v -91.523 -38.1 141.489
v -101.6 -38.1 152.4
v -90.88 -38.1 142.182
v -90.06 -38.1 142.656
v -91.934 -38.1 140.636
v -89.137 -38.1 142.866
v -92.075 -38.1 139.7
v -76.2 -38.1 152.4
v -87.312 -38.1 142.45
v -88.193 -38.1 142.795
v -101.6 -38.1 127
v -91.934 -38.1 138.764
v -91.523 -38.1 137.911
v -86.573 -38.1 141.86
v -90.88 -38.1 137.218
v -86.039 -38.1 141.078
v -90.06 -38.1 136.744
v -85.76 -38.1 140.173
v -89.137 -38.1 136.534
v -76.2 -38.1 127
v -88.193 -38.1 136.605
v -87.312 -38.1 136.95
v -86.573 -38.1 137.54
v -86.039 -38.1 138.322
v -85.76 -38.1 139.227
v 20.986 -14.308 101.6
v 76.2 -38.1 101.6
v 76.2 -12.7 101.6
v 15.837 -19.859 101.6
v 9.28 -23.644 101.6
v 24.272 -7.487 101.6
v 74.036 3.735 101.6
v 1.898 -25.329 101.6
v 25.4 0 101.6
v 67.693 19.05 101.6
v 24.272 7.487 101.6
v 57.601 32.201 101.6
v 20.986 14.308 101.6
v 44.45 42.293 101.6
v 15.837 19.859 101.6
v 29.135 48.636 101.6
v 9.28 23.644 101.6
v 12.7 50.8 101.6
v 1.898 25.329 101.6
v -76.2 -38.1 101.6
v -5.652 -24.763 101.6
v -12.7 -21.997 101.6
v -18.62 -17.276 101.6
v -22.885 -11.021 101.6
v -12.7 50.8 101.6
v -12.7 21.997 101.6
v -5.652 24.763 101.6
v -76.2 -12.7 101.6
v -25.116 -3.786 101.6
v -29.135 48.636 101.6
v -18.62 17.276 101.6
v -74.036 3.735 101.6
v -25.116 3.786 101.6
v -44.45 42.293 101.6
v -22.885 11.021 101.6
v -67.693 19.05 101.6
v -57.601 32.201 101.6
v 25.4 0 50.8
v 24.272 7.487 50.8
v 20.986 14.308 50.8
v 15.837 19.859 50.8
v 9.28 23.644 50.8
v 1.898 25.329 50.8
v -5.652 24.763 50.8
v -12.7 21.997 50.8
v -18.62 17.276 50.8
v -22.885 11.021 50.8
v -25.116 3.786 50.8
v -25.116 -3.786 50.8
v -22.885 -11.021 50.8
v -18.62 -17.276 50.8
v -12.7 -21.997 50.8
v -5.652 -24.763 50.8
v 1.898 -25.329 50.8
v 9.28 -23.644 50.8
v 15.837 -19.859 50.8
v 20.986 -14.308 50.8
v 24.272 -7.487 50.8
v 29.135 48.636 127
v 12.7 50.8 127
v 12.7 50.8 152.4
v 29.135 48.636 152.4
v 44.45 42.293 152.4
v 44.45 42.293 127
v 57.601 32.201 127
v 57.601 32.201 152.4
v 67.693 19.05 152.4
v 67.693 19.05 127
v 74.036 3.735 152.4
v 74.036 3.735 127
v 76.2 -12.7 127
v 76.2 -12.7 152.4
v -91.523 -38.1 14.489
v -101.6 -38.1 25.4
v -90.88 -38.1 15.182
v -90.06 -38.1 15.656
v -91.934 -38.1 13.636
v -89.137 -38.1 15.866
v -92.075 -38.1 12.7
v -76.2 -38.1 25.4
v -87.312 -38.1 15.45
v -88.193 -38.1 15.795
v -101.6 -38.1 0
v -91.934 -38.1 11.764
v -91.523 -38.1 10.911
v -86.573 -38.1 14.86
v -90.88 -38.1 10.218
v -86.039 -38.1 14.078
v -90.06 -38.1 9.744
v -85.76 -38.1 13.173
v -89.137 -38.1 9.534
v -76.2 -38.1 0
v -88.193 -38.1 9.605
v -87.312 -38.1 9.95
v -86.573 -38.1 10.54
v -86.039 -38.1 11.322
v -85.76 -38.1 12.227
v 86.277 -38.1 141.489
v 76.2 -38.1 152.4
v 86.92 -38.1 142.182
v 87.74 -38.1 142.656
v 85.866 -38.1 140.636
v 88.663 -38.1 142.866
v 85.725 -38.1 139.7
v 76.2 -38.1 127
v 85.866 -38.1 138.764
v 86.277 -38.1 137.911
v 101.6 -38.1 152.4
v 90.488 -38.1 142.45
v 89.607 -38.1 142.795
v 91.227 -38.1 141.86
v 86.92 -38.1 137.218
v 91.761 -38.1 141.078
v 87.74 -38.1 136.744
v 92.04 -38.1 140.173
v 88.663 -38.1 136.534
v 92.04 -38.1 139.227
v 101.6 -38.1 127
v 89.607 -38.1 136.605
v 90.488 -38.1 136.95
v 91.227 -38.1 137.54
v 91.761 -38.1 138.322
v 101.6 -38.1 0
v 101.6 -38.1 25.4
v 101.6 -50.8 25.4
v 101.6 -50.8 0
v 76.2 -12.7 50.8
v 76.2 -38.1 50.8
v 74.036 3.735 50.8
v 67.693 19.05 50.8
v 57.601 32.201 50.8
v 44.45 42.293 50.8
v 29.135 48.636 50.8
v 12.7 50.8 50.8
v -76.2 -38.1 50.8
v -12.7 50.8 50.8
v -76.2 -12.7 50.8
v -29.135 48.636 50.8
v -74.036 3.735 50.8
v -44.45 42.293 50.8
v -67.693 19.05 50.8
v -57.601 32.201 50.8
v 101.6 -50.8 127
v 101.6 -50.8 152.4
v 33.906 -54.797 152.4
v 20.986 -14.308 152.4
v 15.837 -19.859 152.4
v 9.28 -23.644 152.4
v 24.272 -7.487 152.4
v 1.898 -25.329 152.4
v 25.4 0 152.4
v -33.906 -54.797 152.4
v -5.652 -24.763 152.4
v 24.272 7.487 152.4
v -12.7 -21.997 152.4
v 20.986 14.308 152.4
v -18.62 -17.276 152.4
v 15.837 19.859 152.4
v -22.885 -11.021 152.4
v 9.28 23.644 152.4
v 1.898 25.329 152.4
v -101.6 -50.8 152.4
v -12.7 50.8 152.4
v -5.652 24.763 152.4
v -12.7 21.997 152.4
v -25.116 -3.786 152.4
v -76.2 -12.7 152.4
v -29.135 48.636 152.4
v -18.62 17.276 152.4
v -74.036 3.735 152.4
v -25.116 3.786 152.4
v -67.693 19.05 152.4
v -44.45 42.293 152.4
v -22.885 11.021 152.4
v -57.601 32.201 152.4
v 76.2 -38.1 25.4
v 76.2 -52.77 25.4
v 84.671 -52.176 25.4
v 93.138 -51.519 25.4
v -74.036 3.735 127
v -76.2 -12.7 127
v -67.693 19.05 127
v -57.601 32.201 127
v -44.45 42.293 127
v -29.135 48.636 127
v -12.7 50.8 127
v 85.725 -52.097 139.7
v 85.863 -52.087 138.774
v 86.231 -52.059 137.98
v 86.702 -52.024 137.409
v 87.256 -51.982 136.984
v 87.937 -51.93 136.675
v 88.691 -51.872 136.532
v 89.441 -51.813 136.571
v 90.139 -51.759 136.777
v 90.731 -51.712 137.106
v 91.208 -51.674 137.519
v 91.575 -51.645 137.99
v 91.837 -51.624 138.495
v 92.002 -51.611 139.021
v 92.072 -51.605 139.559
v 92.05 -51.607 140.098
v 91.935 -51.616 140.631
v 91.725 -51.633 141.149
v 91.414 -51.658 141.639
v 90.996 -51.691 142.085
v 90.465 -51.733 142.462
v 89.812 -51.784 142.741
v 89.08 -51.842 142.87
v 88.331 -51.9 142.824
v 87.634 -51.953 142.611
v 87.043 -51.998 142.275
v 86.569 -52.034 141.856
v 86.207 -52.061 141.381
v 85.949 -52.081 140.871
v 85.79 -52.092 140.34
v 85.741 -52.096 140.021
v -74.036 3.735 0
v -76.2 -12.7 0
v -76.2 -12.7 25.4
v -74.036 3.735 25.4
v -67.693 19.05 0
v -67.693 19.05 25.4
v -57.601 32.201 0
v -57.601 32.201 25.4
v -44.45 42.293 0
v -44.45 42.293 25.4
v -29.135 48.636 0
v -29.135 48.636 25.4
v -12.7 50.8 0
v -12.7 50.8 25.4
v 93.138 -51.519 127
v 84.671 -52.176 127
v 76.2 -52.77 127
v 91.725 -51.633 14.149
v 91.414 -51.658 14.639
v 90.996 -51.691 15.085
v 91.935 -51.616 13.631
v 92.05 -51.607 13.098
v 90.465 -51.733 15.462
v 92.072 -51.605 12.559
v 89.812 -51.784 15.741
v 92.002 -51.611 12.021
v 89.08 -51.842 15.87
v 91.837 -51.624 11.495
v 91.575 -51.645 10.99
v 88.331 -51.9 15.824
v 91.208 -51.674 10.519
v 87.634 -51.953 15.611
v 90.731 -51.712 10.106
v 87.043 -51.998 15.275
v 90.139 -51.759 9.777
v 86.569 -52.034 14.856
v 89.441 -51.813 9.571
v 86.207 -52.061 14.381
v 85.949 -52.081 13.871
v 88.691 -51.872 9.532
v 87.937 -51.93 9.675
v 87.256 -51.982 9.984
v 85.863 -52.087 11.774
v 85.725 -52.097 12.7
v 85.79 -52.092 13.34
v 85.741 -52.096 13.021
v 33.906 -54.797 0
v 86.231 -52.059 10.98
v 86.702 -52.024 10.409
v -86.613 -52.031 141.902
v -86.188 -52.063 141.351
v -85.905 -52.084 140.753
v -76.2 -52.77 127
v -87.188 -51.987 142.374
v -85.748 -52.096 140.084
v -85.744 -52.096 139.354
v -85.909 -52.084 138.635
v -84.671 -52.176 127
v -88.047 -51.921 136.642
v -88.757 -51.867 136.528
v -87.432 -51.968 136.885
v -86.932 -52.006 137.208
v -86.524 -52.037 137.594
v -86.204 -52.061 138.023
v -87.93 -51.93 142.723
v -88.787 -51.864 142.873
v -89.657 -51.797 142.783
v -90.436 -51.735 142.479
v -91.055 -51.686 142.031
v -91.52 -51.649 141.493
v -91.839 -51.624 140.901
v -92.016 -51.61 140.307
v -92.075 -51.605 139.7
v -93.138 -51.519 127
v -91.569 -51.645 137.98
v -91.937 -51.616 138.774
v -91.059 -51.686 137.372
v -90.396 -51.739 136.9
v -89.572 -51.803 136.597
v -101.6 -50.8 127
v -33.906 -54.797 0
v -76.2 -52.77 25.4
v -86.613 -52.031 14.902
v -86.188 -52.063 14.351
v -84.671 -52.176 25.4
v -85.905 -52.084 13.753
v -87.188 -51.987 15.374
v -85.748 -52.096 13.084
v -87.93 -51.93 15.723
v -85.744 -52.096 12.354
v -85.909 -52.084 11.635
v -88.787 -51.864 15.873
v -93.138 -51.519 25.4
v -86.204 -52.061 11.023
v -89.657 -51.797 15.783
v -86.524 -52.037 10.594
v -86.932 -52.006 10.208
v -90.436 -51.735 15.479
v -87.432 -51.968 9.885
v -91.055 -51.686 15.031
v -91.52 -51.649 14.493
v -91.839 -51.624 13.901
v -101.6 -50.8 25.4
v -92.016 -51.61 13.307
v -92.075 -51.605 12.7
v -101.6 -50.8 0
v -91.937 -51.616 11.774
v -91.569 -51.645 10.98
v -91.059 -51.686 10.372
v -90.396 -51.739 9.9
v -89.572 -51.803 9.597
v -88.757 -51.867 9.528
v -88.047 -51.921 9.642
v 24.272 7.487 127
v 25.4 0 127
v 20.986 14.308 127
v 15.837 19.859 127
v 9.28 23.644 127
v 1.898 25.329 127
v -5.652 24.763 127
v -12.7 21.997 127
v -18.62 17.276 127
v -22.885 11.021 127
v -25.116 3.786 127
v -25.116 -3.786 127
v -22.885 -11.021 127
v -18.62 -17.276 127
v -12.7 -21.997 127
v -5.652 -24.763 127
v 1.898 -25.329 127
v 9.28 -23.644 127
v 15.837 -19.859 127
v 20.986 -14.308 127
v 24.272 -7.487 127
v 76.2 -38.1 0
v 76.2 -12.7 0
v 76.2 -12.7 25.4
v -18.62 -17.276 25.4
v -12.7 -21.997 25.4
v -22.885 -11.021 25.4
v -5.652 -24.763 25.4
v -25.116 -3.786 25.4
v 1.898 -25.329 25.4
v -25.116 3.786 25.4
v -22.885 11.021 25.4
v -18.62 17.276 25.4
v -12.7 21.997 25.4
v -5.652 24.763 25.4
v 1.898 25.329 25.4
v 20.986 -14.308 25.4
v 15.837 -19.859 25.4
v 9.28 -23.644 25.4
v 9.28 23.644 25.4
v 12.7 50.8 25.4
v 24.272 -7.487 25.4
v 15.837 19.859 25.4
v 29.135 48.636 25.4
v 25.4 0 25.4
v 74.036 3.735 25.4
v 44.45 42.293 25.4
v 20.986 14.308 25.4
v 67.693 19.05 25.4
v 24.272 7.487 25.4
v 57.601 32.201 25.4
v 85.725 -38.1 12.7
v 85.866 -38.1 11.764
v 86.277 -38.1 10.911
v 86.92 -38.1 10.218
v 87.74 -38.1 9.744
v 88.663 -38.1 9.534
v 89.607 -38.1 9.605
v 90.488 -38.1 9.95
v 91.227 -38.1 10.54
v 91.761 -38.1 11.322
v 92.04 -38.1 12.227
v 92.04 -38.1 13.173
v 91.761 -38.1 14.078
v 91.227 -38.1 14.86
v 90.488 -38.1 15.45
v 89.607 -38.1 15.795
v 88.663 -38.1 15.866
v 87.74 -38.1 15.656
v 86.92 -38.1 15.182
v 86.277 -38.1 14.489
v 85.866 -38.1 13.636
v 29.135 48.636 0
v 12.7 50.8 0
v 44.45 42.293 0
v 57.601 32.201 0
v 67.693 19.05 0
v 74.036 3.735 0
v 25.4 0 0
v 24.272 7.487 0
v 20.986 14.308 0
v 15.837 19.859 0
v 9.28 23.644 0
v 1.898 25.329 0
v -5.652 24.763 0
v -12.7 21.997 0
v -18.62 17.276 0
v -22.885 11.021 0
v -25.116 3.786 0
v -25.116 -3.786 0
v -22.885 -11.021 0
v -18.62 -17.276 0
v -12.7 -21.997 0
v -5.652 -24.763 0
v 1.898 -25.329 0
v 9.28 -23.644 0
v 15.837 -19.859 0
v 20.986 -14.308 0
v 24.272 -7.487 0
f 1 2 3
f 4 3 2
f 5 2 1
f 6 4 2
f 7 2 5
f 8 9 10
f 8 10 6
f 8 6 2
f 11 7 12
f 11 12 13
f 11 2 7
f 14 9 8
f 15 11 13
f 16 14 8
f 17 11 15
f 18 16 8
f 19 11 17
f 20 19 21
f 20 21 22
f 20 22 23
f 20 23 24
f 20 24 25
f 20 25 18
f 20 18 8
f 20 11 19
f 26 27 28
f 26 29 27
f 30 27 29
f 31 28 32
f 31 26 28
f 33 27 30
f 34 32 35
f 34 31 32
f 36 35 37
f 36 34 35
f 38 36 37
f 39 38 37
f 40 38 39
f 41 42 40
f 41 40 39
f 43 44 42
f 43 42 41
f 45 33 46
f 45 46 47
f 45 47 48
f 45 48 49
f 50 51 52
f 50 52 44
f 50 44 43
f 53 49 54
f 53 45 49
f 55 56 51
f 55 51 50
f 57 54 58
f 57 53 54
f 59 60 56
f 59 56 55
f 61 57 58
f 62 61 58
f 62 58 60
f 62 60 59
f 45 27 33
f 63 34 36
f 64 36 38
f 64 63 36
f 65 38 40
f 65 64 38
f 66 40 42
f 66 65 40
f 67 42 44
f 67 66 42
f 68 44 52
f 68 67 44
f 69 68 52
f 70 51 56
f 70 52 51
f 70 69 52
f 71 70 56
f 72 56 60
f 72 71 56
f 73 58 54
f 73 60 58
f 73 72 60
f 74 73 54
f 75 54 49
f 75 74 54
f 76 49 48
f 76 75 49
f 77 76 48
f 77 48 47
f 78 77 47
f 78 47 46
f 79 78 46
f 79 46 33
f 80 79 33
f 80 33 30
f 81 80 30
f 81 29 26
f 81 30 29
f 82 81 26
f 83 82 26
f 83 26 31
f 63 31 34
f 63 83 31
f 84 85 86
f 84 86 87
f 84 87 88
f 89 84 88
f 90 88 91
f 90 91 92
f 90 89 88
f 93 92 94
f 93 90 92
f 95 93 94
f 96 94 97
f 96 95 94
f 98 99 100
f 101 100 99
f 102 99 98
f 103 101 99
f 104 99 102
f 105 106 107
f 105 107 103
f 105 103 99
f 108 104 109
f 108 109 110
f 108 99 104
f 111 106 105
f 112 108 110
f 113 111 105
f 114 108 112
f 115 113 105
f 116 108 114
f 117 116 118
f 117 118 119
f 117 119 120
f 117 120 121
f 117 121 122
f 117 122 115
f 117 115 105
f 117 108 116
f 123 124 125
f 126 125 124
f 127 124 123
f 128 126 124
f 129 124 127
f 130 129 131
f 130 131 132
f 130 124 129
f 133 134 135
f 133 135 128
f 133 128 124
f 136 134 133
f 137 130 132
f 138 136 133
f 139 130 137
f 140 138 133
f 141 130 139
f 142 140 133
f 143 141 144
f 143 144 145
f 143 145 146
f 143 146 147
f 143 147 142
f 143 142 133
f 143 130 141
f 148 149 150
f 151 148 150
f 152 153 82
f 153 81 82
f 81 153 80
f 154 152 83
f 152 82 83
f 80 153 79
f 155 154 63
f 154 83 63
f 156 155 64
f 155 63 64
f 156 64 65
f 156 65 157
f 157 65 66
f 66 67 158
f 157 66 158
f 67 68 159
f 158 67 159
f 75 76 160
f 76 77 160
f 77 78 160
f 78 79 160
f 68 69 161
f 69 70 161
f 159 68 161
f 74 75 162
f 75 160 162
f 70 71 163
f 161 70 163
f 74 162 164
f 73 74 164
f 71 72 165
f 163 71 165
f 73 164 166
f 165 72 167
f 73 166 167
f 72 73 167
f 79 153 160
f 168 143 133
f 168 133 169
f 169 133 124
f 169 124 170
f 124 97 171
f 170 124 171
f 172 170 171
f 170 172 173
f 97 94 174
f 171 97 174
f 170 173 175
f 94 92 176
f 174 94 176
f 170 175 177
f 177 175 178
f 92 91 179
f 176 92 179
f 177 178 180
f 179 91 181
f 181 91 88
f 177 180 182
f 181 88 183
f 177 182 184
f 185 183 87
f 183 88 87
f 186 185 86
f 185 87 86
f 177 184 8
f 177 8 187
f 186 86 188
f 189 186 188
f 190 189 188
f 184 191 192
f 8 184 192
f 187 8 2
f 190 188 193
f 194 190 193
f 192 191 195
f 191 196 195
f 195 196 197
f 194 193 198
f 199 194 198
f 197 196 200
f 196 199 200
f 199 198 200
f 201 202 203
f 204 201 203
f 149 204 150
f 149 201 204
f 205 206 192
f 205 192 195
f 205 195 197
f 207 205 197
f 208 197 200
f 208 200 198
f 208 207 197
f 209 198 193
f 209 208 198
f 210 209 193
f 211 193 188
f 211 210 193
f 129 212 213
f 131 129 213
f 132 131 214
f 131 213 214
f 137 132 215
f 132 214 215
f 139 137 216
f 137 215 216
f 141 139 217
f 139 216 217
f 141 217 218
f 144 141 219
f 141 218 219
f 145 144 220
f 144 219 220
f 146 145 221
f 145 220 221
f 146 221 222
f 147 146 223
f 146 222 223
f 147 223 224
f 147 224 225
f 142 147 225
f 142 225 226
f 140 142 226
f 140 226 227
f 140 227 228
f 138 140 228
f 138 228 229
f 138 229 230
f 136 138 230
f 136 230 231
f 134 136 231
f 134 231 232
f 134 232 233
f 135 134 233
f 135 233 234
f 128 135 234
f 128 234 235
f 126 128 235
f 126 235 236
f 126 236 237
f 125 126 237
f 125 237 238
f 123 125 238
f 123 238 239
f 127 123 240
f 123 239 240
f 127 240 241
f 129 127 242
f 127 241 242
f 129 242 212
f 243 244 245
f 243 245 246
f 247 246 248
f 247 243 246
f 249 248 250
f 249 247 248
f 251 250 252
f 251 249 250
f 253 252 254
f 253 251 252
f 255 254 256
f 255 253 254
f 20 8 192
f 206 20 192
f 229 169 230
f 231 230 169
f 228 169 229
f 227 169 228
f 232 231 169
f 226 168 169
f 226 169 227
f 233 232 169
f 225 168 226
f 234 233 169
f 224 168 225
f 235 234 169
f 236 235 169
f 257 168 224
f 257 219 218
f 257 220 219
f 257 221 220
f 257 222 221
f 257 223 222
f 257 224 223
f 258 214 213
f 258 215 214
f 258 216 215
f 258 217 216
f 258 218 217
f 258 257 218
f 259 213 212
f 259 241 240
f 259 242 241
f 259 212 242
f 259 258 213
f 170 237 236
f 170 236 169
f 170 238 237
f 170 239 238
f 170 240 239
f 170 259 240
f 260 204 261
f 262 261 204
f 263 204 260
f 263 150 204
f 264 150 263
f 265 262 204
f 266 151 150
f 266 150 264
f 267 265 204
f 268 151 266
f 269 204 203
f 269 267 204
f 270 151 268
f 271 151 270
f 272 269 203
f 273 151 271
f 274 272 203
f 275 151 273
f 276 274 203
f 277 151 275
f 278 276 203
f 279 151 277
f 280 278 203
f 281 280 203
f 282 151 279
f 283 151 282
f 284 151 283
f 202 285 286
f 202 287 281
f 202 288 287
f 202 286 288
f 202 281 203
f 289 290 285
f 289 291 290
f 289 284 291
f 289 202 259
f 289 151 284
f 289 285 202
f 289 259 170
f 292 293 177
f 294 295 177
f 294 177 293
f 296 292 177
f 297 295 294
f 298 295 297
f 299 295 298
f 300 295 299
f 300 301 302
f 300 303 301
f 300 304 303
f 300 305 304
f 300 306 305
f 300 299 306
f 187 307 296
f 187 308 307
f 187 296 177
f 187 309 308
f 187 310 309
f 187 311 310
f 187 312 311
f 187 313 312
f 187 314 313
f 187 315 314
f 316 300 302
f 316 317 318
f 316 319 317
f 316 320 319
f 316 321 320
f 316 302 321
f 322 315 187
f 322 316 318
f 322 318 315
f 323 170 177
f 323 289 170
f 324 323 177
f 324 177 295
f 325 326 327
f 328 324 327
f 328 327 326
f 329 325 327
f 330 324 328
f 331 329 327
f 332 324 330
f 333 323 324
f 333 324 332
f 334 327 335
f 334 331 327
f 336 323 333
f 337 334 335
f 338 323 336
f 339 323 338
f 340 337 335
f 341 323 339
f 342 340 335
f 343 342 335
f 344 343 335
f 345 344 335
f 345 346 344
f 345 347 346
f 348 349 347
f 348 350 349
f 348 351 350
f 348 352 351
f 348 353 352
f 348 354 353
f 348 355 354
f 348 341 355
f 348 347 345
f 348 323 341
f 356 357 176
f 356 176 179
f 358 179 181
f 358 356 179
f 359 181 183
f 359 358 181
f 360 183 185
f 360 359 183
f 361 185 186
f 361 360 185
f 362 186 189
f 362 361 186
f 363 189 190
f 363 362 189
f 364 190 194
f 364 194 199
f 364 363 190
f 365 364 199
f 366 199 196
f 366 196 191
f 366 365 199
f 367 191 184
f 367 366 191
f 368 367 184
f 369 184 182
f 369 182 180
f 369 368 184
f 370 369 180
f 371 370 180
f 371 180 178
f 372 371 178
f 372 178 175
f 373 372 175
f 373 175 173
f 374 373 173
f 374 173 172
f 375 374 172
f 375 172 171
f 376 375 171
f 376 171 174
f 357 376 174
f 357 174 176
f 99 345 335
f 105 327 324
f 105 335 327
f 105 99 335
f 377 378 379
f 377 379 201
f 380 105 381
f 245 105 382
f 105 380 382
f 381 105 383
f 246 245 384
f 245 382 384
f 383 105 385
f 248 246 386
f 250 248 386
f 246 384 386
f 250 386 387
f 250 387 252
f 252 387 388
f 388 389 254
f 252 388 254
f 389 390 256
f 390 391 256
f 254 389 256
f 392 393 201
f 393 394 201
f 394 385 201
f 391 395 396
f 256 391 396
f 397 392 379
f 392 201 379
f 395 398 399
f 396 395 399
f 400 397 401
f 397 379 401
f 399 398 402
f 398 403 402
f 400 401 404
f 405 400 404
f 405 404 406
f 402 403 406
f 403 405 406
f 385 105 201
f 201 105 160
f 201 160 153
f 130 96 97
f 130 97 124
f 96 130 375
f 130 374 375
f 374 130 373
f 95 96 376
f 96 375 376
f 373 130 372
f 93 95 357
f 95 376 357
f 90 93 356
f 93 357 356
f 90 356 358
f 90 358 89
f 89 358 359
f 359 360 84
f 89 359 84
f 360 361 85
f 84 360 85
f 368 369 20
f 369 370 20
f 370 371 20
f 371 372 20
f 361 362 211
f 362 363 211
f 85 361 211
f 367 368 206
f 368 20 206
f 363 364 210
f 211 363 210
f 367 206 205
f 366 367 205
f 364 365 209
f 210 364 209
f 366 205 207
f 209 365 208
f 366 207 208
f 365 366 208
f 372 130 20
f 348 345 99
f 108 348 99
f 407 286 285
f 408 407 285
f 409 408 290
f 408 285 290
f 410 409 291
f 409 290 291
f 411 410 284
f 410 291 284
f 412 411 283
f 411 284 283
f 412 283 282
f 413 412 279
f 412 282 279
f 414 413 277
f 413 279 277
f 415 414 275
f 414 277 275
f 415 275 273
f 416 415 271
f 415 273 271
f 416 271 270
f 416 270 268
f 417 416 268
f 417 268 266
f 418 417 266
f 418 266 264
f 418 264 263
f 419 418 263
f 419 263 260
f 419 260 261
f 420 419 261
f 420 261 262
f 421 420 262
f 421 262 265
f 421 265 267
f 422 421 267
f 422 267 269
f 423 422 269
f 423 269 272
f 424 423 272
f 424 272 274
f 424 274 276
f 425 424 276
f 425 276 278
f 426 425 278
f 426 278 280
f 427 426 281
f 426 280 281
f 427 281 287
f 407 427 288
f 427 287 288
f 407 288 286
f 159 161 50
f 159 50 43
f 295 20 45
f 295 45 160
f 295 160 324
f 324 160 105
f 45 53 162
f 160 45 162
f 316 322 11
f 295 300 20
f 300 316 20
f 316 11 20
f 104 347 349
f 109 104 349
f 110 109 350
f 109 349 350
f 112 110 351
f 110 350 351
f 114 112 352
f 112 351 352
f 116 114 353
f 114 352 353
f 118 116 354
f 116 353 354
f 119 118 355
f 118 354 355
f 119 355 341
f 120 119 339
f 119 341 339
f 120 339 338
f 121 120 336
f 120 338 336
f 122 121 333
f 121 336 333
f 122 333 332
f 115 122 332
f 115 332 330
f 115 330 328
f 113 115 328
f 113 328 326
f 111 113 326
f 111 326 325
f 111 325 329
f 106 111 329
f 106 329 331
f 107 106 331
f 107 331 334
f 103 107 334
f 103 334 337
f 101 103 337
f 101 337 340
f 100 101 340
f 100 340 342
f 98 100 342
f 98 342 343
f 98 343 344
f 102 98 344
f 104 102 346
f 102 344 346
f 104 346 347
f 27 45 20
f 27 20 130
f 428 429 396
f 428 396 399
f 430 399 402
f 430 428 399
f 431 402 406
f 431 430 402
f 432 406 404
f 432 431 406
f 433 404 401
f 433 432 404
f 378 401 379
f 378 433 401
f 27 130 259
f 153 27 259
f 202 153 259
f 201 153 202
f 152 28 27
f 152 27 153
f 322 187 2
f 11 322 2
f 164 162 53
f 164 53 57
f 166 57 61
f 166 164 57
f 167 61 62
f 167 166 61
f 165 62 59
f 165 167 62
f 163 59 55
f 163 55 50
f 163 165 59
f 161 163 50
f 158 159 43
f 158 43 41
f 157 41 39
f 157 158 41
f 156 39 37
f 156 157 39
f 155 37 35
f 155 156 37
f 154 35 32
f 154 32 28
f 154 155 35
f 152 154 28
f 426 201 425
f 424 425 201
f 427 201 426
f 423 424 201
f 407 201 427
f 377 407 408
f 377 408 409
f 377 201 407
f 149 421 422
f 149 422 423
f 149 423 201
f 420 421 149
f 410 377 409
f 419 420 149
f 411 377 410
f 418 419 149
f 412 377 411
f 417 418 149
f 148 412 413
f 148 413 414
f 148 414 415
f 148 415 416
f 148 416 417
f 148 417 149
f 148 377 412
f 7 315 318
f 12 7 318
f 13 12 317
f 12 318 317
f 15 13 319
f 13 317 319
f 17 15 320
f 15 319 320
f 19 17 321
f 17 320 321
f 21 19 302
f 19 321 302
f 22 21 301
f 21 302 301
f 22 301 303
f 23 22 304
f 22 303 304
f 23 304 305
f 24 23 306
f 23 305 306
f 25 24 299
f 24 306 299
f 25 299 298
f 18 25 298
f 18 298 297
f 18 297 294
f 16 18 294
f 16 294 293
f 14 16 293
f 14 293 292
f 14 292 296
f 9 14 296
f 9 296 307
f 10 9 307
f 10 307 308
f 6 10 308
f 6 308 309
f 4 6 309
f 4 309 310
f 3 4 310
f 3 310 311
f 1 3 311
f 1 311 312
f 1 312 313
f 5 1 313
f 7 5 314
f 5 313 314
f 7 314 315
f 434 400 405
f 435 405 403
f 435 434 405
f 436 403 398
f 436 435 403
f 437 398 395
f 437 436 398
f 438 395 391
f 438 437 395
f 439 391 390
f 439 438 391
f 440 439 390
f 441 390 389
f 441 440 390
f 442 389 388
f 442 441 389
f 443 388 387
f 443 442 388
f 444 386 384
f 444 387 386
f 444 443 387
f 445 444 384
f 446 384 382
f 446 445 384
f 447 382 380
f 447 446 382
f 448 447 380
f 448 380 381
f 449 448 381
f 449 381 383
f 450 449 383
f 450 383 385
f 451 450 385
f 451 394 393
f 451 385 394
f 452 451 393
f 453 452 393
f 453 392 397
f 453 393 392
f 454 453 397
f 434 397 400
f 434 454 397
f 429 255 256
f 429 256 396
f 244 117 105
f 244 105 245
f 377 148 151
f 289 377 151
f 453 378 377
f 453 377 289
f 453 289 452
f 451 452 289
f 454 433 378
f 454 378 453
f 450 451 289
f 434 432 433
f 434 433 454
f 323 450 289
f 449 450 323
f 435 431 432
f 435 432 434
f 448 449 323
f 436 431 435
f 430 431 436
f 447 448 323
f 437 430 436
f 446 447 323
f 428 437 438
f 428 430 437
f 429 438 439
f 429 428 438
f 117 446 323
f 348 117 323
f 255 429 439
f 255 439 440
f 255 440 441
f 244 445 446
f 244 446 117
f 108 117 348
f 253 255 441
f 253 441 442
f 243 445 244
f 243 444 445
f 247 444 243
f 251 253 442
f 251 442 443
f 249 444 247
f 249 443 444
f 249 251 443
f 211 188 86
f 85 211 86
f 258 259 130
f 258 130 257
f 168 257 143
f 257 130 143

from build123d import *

# Parameters (mm, degrees)
SKETCH1_R                   = 25.4
BOSS_EXTRUDE1_DEPTH         = 152.4
SKETCH3_W                   = 25.4
SKETCH3_H                   = 88.9
CUT_EXTRUDE1_DEPTH          = 102.6
CUT_EXTRUDE1_DEPTH_BACK     = 102.6
F_1_4_0_25_DIAMETER_HOLE1_D = 6.35
SKETCH4_W                   = 25.4
SKETCH4_H                   = 101.6
CUT_EXTRUDE2_DEPTH          = 18.196861737


with BuildPart() as part:
    # Sketch1 → Boss-Extrude1 (new body)
    with BuildSketch(Plane.XY):
        with BuildLine():
            Line((-76.2, -38.1), (-76.2, -12.7))
            ThreePointArc((-76.2, -12.7), (-57.601280605, 32.201280605), (-12.7, 50.8))
            Line((-12.7, 50.8), (12.7, 50.8))
            ThreePointArc((12.7, 50.8), (57.601280605, 32.201280605), (76.2, -12.7))
            Line((76.2, -12.7), (76.2, -38.1))
            Line((76.2, -38.1), (101.6, -38.1))
            Line((101.6, -38.1), (101.6, -50.8))
            ThreePointArc((101.6, -50.8), (0, -55.296861637), (-101.6, -50.8))
            Line((-101.6, -50.8), (-101.6, -38.1))
            Line((-101.6, -38.1), (-76.2, -38.1))
        make_face()
        Circle(SKETCH1_R, mode=Mode.SUBTRACT)
    extrude(amount=BOSS_EXTRUDE1_DEPTH)

    # Sketch3 → Cut-Extrude1 (cut, two sides)
    with BuildSketch(Plane(origin=(0, 0, 0), x_dir=(0, 0, -1), z_dir=(1, 0, 0))) as cut_extrude1_sk:
        with Locations((-114.3, 6.35)):
            Rectangle(SKETCH3_W, SKETCH3_H)
        with Locations((-38.1, 6.35)):
            Rectangle(SKETCH3_W, SKETCH3_H)
    extrude(amount=CUT_EXTRUDE1_DEPTH, mode=Mode.SUBTRACT)
    extrude(cut_extrude1_sk.sketch, amount=-CUT_EXTRUDE1_DEPTH_BACK, mode=Mode.SUBTRACT)

    # 1/4 (0.25) Diameter Hole1 (through all)
    with Locations(Plane(origin=(0, -38.1, 0), x_dir=(1, 0, 0), z_dir=(0, 1, 0))):
        with Locations((-88.9, -12.7), (-88.9, -139.7), (88.9, -12.7), (88.9, -139.7)):
            Hole(F_1_4_0_25_DIAMETER_HOLE1_D / 2)

    # Sketch4 → Cut-Extrude2 (cut, through all)
    with BuildSketch(Plane(origin=(0, -38.1, 0), x_dir=(1, 0, 0), z_dir=(0, 1, 0))):
        with Locations((-88.9, -76.2)):
            Rectangle(SKETCH4_W, SKETCH4_H)
        with Locations((88.9, -76.2)):
            Rectangle(SKETCH4_W, SKETCH4_H)
    extrude(amount=-CUT_EXTRUDE2_DEPTH, mode=Mode.SUBTRACT)


solid = part.part
